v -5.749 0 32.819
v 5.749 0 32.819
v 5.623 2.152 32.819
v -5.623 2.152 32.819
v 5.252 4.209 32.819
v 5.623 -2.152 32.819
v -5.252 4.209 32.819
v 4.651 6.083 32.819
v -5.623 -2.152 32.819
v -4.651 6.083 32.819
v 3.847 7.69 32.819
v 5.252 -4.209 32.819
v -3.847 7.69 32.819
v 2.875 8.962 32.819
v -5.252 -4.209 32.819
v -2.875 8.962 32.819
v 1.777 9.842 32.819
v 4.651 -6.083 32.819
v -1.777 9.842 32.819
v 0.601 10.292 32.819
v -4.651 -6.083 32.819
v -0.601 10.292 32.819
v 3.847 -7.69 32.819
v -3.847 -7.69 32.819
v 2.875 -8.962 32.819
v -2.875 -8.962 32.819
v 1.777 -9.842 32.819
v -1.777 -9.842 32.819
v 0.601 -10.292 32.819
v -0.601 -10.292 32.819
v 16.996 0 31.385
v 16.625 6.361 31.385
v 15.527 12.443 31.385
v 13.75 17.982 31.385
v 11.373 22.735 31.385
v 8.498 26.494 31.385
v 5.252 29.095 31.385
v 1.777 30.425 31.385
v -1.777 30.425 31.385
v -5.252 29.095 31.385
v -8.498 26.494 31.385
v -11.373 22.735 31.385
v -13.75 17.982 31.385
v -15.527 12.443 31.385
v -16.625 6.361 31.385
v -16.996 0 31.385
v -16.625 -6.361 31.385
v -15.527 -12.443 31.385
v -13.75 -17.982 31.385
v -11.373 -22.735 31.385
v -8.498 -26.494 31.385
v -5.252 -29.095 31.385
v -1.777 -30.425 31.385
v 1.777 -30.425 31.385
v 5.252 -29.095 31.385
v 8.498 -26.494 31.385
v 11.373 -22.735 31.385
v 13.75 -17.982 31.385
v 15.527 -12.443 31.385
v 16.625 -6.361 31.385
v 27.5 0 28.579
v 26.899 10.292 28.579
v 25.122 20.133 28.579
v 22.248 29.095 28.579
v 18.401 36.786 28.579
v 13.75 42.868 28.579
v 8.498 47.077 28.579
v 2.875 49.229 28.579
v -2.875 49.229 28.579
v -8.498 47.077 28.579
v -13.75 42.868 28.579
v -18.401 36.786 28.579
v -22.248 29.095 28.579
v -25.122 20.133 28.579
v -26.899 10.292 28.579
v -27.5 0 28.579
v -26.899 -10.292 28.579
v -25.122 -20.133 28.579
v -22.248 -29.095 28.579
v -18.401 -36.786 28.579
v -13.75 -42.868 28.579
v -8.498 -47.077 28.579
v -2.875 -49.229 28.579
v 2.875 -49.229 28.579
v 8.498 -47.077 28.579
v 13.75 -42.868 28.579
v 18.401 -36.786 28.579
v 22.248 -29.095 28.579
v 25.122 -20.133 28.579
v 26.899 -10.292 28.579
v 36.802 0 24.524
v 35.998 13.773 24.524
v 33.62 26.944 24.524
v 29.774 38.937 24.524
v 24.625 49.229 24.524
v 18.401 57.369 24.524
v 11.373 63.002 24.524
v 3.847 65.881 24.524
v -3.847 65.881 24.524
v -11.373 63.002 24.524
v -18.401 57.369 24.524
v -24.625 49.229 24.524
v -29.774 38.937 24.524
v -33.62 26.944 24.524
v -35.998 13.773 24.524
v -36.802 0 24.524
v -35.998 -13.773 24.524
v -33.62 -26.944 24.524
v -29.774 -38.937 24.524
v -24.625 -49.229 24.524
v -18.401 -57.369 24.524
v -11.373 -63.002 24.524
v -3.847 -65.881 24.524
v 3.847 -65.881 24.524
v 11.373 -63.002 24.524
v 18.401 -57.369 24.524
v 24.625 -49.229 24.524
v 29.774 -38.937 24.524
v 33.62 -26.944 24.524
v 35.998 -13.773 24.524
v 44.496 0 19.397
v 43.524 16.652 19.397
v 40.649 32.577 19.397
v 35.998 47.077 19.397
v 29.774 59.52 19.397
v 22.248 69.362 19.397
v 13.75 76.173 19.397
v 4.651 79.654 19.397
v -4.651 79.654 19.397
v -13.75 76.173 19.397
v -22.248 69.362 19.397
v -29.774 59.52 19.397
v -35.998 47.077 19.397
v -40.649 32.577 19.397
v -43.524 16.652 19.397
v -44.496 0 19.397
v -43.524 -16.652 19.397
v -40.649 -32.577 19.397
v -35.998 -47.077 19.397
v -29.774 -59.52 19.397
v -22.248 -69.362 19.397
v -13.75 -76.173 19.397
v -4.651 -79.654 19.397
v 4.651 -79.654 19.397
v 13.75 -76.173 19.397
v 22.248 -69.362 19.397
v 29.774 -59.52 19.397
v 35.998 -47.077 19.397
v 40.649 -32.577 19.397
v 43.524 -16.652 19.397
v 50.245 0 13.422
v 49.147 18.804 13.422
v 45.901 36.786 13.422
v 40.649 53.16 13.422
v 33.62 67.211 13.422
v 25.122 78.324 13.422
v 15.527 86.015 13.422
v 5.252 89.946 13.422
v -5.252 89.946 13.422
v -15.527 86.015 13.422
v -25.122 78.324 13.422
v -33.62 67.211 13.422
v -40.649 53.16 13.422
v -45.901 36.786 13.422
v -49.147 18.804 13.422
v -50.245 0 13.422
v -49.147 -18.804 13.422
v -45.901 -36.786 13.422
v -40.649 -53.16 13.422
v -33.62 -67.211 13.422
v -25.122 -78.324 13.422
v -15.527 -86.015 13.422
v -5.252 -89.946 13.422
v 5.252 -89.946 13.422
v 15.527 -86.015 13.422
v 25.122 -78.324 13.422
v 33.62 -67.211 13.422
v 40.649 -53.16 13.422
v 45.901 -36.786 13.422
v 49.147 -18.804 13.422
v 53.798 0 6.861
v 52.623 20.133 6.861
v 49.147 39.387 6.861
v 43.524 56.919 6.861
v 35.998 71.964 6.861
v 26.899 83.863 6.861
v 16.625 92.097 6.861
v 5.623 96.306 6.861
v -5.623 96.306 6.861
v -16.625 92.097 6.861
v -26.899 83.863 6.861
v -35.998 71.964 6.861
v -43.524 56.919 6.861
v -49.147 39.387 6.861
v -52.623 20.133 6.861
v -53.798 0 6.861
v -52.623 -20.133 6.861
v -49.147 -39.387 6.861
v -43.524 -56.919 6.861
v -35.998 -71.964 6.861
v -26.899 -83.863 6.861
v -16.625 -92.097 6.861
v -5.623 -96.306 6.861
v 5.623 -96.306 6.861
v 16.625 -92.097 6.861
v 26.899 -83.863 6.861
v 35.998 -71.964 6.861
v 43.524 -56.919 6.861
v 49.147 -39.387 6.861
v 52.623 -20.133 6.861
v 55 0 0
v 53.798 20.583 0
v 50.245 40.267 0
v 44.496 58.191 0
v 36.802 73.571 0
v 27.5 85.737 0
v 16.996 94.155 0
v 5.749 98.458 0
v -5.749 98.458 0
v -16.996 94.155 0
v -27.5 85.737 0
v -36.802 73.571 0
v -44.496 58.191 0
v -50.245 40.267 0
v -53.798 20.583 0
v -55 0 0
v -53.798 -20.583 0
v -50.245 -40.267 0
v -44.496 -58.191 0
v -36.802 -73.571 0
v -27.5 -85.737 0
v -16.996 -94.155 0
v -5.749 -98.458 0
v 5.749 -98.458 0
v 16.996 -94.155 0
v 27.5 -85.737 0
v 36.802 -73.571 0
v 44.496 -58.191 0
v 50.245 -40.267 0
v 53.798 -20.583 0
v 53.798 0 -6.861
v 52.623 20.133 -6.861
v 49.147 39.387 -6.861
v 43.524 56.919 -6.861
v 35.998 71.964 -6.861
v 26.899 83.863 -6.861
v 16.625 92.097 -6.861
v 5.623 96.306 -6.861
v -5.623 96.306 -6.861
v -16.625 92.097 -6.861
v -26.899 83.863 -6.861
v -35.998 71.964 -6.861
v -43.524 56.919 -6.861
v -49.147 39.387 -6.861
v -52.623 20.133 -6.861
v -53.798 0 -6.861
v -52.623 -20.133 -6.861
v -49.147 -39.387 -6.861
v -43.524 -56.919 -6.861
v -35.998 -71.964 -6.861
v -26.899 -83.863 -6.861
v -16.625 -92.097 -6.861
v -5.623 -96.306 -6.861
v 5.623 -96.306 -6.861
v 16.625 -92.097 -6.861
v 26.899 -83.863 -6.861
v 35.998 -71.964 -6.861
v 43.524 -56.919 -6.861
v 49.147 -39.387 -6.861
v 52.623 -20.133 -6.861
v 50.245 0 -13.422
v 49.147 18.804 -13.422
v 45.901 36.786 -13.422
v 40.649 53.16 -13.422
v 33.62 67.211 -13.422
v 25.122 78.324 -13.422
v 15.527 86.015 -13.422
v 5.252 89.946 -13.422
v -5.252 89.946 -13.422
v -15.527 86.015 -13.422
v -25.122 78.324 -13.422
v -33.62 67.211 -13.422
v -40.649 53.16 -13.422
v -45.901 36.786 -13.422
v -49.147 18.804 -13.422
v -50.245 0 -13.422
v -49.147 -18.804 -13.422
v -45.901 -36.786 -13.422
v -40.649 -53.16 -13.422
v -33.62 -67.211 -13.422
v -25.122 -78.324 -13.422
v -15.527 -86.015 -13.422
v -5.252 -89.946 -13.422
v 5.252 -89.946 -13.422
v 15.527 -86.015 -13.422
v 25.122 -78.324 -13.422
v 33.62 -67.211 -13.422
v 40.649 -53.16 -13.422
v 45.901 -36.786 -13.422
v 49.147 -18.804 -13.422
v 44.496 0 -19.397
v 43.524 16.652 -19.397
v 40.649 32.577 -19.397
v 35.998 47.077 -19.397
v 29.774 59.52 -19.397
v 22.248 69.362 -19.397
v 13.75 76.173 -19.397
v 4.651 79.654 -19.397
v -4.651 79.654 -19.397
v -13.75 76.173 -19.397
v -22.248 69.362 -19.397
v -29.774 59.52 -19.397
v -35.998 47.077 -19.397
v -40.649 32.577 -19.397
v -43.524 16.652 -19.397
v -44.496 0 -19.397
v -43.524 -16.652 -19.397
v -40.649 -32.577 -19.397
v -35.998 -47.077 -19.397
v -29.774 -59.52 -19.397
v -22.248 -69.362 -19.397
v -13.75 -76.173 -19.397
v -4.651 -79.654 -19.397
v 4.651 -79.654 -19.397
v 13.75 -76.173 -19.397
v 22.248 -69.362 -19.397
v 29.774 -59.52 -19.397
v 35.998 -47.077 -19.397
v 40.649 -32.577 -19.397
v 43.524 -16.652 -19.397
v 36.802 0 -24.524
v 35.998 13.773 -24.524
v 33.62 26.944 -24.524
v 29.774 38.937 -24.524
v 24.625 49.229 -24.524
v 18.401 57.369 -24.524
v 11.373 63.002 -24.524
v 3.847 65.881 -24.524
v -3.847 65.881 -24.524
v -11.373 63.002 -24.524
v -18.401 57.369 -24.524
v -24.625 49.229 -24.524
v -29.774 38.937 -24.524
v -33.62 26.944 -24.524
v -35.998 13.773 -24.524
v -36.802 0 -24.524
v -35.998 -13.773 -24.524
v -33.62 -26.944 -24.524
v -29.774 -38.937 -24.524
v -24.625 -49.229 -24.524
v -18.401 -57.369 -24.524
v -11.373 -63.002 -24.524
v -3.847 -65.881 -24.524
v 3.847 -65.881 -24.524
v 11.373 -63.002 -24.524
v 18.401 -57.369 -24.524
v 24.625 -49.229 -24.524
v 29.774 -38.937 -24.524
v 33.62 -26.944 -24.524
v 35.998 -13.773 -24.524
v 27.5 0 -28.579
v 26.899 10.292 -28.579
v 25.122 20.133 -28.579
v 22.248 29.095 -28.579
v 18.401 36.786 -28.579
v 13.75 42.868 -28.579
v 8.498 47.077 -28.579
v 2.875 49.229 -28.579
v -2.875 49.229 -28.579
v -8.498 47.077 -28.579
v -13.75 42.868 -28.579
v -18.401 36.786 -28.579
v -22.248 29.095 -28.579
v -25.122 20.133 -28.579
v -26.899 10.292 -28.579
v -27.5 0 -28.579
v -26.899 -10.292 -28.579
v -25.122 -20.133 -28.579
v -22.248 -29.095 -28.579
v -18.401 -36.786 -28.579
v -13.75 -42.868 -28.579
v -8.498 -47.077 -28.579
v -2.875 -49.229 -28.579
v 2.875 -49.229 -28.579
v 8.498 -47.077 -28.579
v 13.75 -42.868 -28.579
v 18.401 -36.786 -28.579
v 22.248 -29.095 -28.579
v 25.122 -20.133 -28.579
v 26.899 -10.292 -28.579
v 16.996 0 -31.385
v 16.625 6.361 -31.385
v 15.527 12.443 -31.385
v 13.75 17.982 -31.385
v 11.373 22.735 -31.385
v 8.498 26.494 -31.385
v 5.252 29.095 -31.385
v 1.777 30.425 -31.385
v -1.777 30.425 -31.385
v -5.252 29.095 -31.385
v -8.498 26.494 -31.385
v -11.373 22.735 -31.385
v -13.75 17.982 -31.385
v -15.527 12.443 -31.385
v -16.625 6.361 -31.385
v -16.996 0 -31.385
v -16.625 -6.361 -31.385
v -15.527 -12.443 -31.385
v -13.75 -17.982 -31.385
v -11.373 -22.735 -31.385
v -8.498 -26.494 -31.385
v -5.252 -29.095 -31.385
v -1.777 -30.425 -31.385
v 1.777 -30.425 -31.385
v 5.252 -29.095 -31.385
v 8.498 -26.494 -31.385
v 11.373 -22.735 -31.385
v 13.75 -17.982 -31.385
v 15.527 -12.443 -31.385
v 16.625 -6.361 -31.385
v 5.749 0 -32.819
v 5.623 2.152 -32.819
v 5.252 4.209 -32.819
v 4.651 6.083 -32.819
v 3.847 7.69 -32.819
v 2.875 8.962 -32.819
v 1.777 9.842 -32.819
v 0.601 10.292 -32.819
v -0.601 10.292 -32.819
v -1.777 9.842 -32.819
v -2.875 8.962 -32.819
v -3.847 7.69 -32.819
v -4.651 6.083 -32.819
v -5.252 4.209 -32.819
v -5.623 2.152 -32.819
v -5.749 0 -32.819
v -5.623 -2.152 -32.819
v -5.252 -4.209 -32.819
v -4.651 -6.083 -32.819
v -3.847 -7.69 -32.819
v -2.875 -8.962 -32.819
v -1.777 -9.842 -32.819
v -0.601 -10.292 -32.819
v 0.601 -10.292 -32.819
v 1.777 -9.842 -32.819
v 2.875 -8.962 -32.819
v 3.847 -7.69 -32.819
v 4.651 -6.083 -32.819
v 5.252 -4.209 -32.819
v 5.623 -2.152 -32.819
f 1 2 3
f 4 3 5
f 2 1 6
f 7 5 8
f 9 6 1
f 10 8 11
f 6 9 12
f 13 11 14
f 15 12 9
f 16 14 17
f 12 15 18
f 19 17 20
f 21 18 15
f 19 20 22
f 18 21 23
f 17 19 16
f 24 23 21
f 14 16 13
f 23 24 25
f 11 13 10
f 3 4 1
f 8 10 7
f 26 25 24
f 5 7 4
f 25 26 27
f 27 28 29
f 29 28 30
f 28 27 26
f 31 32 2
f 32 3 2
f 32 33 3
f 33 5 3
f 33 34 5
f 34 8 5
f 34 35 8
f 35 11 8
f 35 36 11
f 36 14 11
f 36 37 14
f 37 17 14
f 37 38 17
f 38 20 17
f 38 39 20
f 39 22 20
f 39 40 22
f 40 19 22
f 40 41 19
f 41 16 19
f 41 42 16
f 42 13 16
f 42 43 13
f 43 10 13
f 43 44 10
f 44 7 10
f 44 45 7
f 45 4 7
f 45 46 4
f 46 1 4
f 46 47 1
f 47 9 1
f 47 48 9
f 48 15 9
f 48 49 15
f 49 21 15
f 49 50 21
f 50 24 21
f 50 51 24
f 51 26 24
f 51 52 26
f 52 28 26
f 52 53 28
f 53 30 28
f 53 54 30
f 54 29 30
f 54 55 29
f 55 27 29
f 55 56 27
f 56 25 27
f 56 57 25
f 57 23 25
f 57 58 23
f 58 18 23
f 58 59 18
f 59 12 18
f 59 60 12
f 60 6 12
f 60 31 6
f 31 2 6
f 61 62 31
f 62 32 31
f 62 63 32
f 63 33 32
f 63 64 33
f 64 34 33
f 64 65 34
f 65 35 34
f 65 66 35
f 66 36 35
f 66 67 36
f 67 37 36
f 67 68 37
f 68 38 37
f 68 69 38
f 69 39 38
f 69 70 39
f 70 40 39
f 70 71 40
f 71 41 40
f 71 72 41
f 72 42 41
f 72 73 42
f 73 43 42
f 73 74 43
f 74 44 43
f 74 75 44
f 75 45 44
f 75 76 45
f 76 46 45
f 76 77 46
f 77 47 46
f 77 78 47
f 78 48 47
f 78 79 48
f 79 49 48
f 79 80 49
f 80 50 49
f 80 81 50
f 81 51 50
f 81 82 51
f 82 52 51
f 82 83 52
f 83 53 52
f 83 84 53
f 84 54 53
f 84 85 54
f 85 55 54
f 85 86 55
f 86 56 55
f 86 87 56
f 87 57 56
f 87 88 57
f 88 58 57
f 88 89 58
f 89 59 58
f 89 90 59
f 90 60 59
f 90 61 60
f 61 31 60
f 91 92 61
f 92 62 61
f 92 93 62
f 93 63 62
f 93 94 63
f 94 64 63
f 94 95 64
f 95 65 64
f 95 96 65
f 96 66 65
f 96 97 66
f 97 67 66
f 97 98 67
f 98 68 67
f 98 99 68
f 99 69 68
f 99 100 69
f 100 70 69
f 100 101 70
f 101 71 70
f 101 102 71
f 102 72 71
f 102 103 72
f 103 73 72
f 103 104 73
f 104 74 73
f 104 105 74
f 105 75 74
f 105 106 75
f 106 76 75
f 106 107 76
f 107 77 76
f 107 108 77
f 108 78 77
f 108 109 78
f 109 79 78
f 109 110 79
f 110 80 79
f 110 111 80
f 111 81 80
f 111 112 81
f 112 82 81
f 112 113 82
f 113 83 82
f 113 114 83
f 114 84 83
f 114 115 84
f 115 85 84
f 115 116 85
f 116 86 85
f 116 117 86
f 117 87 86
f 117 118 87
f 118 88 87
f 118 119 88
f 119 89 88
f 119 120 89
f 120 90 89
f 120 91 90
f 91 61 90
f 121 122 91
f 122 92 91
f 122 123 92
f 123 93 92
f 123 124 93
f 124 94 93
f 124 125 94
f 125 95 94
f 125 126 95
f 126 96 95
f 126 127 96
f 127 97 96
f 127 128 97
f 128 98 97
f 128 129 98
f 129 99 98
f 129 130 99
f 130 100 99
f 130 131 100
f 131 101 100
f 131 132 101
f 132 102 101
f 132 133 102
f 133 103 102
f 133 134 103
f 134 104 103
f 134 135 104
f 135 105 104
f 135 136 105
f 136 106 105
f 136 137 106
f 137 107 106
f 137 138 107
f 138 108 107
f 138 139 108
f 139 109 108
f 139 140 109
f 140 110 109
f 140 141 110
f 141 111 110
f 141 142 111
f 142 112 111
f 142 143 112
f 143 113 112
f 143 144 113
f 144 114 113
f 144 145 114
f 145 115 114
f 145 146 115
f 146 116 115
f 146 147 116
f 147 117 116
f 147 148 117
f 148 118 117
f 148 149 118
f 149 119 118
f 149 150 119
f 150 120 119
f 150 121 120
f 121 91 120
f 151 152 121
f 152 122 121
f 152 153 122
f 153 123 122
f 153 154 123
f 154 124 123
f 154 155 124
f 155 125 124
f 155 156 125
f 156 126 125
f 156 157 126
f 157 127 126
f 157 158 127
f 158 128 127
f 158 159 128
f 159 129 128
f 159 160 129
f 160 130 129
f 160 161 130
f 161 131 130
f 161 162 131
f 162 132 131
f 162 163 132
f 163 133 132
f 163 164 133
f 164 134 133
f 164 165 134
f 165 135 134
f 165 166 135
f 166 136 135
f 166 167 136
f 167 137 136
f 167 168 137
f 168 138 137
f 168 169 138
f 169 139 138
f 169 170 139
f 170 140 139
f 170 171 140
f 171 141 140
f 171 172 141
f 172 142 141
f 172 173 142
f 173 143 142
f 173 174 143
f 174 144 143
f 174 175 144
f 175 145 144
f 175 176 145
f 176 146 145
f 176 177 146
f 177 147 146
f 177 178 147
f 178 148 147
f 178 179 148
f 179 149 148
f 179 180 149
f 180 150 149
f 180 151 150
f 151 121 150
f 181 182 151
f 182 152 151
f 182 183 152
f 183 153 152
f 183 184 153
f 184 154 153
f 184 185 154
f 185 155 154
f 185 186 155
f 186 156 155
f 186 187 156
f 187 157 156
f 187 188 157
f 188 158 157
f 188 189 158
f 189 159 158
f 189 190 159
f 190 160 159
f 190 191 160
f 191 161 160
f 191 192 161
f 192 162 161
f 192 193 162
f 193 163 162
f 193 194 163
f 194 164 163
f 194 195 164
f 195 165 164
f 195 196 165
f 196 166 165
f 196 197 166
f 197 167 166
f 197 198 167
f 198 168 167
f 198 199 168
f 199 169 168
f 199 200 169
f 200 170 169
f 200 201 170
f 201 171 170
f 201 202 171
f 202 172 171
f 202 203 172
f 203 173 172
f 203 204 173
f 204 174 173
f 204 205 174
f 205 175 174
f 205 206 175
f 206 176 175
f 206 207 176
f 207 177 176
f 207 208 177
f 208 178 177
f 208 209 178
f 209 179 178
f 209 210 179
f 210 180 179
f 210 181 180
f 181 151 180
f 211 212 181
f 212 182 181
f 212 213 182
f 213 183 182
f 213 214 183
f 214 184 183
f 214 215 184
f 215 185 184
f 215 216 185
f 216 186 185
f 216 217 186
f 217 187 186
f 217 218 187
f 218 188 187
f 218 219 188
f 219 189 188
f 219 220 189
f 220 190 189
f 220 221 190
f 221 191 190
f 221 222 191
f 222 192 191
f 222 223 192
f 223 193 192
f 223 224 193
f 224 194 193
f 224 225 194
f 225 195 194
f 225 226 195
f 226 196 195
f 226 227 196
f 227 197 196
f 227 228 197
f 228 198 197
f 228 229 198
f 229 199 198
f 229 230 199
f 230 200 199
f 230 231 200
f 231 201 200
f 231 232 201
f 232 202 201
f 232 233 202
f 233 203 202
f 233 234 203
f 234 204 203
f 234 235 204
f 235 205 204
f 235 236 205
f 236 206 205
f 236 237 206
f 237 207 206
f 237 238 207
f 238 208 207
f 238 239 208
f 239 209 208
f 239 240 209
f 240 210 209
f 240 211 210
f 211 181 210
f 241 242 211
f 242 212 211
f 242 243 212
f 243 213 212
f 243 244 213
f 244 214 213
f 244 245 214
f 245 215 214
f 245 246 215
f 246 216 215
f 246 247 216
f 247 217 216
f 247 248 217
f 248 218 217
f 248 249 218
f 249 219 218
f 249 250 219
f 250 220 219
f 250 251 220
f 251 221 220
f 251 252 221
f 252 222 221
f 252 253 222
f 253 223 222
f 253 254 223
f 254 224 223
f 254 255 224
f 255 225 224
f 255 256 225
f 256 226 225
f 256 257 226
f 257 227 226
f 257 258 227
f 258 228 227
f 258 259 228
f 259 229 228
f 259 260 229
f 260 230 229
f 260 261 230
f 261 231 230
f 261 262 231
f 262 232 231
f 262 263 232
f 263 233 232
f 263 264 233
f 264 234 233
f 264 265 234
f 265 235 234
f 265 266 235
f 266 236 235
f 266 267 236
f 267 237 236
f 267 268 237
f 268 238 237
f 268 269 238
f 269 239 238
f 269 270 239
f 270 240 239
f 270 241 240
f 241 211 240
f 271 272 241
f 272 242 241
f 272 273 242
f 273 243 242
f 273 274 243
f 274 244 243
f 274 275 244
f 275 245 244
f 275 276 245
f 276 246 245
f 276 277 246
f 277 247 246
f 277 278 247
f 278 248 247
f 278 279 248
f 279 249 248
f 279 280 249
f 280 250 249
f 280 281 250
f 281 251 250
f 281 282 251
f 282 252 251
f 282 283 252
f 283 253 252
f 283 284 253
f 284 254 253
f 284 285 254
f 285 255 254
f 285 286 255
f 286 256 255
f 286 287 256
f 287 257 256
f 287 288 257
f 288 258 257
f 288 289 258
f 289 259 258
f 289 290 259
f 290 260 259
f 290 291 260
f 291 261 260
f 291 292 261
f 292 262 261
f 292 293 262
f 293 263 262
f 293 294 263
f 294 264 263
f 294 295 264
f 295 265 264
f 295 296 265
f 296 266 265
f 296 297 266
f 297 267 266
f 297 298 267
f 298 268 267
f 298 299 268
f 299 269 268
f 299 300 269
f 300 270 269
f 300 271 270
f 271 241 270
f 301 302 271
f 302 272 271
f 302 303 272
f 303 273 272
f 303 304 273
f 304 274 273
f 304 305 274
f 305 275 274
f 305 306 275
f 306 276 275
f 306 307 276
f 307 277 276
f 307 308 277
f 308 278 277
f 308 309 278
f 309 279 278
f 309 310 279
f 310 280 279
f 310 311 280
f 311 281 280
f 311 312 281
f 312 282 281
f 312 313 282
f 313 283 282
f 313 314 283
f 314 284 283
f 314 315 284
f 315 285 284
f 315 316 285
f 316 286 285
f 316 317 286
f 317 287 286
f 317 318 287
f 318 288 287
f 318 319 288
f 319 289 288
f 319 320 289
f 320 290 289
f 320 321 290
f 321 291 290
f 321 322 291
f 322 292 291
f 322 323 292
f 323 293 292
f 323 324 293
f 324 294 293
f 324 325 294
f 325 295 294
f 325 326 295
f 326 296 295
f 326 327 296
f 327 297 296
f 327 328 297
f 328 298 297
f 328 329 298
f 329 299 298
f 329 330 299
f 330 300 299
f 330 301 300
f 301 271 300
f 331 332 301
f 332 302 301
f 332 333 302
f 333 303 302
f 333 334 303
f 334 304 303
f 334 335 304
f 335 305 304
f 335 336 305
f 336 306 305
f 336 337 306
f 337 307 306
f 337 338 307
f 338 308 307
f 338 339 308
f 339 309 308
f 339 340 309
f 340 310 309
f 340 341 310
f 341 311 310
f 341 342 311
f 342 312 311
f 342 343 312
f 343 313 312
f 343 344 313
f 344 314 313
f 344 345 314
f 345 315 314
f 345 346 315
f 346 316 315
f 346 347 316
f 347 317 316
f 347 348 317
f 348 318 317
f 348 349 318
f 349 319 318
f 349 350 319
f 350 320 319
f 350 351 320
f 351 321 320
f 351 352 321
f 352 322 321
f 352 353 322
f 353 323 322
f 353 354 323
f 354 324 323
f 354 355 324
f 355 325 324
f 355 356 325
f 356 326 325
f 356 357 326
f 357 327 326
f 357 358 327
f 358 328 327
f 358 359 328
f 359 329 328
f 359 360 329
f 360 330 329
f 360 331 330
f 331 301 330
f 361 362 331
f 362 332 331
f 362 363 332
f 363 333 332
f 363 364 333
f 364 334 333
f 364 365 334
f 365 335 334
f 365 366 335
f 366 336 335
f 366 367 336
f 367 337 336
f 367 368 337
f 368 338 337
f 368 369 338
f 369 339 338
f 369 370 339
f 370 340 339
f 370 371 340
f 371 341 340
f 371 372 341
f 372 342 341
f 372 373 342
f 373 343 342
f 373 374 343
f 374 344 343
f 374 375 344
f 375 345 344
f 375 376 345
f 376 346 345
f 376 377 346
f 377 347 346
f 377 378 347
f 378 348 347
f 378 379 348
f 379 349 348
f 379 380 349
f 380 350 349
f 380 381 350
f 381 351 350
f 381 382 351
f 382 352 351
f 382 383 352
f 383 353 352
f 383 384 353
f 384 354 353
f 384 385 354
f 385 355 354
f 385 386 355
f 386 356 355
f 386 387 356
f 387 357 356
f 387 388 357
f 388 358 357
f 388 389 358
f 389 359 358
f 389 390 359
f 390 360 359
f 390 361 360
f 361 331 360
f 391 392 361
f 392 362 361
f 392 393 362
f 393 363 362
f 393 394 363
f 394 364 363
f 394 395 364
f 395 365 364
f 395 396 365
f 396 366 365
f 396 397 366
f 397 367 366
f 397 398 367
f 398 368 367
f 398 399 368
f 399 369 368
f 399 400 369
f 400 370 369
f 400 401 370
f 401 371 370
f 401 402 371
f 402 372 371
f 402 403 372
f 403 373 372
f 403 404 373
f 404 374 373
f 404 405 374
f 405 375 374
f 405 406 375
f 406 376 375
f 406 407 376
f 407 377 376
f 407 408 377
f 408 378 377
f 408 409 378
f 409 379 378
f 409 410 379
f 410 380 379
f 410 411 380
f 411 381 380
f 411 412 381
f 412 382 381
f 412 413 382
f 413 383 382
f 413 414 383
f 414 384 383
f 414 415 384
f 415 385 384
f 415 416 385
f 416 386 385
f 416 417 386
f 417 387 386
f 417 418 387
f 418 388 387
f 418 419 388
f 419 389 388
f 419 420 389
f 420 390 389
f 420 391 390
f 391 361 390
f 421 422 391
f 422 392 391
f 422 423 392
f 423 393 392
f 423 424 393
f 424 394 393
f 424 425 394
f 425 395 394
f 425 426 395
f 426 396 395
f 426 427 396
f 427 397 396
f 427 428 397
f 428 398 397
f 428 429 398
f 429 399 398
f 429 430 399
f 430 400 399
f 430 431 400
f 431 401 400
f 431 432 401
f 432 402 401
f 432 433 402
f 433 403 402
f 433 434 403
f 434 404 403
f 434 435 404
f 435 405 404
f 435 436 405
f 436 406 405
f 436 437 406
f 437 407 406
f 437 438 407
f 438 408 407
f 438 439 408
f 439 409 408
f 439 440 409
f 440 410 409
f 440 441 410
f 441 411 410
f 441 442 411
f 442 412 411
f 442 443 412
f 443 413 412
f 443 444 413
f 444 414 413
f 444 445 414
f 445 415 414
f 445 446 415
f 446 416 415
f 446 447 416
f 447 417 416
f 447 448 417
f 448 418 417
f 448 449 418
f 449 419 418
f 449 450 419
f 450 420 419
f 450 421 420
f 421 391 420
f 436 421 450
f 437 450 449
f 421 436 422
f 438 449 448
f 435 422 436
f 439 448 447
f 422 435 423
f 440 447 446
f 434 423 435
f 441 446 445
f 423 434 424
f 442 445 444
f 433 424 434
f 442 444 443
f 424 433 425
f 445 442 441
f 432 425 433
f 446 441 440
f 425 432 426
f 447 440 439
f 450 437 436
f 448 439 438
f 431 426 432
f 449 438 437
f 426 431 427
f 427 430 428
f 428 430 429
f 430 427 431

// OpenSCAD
// Generated by SolidPython 1.0.1 on 2020-07-29 00:46:46


scale(v = [5, 9, 3]) {
	sphere(r = 11);
}
/***********************************************
*********      SolidPython code:      **********
************************************************
 
# import packages: SolidPython
from solid import *
from solid.utils import *
from itertools import chain, combinations, permutations


class Resize:

    def __init__(self, scad_file):
        self.scad_file = scad_file
        #self.scad_file = import_scad(scad_file)
        # cone/cylinder param:
        self.r1 = 0
        self.r2 = 0
        self.h = 0
        # rectangular prism param:
        self.w = 0
        self.l = 0
        # ellipse param:
        self.r = 0

    # import OpenScad code (file name corresponds to shape)


    # classify shape + parameters
    def assign(self, param1, param2, param3):
        if self.scad_file == 'cone.scad':
            self.r1 = param1
            self.r2 = param2
            self.h = param3
        elif self.scad_file == 'cylinder.scad':
            self.r1 = param1
            self.r2 = param2
            self.h = param3
        elif self.scad_file == 'rectangularPrism.scad':
            self.h = param1
            self.l = param2
            self.w = param3
        else:
            self.r = param1
            self.h = param2

    # resize parameters
    def iterate(self):
        x = range(3, 20, 2)
        i = 1
        if self.scad_file == 'cone.scad':
            tempList = list(permutations(x, 2))
            for temp in tempList:
                param1 = temp[0]
                param2 = temp[1]
                filepath = 'produced_scad_files/' + 'cone' + str(param1) + '_' + str(param2) + '_' + '.scad'
                scad_render_to_file(cylinder(h=param1, r1=param2, r2=0), filepath)

        elif self.scad_file == 'cylinder.scad':
            tempList = list(permutations(x, 3))
            for temp in tempList:
                param1 = temp[0]
                param2 = temp[1]
                filepath = 'produced_scad_files/' + 'cylinder' + str(param1) + '_' + str(param2) + '_' + '.scad'
                scad_render_to_file(cylinder(h=param1, r1=param2, r2=param2), filepath)

        elif self.scad_file == 'rectangularPrism.scad':
            tempList = list(permutations(x, 3))
            for temp in tempList:
                param1 = temp[0]
                param2 = temp[1]
                param3 = temp[2]
                filepath = 'produced_scad_files/' + 'rectangularPrism' + str(param1) + '_' + str(param2) + '_' + str(
                    param3) + '.scad'
                scad_render_to_file(cube(size=(param1, param2, param3)), filepath)

        elif self.scad_file == 'ellipse.scad':
            tempList = list(permutations(x, 4))
            for temp in tempList:
                param1 = temp[0]
                param2 = temp[1]
                param3 = temp[2]
                param4 = temp[3]
                filepath = 'produced_scad_files/' + 'ellipse' + str(param1) + '_' + str(param2) + '_' + str(param3) + '_' + str(param4) + '.scad'
                scad_render_to_file(scale([param1, param2, param3])(sphere(r=param4)), filepath)

    def render_to_scadfile(self):
        scad_render_to_file(scad, 'example.scad') 
 
************************************************/
